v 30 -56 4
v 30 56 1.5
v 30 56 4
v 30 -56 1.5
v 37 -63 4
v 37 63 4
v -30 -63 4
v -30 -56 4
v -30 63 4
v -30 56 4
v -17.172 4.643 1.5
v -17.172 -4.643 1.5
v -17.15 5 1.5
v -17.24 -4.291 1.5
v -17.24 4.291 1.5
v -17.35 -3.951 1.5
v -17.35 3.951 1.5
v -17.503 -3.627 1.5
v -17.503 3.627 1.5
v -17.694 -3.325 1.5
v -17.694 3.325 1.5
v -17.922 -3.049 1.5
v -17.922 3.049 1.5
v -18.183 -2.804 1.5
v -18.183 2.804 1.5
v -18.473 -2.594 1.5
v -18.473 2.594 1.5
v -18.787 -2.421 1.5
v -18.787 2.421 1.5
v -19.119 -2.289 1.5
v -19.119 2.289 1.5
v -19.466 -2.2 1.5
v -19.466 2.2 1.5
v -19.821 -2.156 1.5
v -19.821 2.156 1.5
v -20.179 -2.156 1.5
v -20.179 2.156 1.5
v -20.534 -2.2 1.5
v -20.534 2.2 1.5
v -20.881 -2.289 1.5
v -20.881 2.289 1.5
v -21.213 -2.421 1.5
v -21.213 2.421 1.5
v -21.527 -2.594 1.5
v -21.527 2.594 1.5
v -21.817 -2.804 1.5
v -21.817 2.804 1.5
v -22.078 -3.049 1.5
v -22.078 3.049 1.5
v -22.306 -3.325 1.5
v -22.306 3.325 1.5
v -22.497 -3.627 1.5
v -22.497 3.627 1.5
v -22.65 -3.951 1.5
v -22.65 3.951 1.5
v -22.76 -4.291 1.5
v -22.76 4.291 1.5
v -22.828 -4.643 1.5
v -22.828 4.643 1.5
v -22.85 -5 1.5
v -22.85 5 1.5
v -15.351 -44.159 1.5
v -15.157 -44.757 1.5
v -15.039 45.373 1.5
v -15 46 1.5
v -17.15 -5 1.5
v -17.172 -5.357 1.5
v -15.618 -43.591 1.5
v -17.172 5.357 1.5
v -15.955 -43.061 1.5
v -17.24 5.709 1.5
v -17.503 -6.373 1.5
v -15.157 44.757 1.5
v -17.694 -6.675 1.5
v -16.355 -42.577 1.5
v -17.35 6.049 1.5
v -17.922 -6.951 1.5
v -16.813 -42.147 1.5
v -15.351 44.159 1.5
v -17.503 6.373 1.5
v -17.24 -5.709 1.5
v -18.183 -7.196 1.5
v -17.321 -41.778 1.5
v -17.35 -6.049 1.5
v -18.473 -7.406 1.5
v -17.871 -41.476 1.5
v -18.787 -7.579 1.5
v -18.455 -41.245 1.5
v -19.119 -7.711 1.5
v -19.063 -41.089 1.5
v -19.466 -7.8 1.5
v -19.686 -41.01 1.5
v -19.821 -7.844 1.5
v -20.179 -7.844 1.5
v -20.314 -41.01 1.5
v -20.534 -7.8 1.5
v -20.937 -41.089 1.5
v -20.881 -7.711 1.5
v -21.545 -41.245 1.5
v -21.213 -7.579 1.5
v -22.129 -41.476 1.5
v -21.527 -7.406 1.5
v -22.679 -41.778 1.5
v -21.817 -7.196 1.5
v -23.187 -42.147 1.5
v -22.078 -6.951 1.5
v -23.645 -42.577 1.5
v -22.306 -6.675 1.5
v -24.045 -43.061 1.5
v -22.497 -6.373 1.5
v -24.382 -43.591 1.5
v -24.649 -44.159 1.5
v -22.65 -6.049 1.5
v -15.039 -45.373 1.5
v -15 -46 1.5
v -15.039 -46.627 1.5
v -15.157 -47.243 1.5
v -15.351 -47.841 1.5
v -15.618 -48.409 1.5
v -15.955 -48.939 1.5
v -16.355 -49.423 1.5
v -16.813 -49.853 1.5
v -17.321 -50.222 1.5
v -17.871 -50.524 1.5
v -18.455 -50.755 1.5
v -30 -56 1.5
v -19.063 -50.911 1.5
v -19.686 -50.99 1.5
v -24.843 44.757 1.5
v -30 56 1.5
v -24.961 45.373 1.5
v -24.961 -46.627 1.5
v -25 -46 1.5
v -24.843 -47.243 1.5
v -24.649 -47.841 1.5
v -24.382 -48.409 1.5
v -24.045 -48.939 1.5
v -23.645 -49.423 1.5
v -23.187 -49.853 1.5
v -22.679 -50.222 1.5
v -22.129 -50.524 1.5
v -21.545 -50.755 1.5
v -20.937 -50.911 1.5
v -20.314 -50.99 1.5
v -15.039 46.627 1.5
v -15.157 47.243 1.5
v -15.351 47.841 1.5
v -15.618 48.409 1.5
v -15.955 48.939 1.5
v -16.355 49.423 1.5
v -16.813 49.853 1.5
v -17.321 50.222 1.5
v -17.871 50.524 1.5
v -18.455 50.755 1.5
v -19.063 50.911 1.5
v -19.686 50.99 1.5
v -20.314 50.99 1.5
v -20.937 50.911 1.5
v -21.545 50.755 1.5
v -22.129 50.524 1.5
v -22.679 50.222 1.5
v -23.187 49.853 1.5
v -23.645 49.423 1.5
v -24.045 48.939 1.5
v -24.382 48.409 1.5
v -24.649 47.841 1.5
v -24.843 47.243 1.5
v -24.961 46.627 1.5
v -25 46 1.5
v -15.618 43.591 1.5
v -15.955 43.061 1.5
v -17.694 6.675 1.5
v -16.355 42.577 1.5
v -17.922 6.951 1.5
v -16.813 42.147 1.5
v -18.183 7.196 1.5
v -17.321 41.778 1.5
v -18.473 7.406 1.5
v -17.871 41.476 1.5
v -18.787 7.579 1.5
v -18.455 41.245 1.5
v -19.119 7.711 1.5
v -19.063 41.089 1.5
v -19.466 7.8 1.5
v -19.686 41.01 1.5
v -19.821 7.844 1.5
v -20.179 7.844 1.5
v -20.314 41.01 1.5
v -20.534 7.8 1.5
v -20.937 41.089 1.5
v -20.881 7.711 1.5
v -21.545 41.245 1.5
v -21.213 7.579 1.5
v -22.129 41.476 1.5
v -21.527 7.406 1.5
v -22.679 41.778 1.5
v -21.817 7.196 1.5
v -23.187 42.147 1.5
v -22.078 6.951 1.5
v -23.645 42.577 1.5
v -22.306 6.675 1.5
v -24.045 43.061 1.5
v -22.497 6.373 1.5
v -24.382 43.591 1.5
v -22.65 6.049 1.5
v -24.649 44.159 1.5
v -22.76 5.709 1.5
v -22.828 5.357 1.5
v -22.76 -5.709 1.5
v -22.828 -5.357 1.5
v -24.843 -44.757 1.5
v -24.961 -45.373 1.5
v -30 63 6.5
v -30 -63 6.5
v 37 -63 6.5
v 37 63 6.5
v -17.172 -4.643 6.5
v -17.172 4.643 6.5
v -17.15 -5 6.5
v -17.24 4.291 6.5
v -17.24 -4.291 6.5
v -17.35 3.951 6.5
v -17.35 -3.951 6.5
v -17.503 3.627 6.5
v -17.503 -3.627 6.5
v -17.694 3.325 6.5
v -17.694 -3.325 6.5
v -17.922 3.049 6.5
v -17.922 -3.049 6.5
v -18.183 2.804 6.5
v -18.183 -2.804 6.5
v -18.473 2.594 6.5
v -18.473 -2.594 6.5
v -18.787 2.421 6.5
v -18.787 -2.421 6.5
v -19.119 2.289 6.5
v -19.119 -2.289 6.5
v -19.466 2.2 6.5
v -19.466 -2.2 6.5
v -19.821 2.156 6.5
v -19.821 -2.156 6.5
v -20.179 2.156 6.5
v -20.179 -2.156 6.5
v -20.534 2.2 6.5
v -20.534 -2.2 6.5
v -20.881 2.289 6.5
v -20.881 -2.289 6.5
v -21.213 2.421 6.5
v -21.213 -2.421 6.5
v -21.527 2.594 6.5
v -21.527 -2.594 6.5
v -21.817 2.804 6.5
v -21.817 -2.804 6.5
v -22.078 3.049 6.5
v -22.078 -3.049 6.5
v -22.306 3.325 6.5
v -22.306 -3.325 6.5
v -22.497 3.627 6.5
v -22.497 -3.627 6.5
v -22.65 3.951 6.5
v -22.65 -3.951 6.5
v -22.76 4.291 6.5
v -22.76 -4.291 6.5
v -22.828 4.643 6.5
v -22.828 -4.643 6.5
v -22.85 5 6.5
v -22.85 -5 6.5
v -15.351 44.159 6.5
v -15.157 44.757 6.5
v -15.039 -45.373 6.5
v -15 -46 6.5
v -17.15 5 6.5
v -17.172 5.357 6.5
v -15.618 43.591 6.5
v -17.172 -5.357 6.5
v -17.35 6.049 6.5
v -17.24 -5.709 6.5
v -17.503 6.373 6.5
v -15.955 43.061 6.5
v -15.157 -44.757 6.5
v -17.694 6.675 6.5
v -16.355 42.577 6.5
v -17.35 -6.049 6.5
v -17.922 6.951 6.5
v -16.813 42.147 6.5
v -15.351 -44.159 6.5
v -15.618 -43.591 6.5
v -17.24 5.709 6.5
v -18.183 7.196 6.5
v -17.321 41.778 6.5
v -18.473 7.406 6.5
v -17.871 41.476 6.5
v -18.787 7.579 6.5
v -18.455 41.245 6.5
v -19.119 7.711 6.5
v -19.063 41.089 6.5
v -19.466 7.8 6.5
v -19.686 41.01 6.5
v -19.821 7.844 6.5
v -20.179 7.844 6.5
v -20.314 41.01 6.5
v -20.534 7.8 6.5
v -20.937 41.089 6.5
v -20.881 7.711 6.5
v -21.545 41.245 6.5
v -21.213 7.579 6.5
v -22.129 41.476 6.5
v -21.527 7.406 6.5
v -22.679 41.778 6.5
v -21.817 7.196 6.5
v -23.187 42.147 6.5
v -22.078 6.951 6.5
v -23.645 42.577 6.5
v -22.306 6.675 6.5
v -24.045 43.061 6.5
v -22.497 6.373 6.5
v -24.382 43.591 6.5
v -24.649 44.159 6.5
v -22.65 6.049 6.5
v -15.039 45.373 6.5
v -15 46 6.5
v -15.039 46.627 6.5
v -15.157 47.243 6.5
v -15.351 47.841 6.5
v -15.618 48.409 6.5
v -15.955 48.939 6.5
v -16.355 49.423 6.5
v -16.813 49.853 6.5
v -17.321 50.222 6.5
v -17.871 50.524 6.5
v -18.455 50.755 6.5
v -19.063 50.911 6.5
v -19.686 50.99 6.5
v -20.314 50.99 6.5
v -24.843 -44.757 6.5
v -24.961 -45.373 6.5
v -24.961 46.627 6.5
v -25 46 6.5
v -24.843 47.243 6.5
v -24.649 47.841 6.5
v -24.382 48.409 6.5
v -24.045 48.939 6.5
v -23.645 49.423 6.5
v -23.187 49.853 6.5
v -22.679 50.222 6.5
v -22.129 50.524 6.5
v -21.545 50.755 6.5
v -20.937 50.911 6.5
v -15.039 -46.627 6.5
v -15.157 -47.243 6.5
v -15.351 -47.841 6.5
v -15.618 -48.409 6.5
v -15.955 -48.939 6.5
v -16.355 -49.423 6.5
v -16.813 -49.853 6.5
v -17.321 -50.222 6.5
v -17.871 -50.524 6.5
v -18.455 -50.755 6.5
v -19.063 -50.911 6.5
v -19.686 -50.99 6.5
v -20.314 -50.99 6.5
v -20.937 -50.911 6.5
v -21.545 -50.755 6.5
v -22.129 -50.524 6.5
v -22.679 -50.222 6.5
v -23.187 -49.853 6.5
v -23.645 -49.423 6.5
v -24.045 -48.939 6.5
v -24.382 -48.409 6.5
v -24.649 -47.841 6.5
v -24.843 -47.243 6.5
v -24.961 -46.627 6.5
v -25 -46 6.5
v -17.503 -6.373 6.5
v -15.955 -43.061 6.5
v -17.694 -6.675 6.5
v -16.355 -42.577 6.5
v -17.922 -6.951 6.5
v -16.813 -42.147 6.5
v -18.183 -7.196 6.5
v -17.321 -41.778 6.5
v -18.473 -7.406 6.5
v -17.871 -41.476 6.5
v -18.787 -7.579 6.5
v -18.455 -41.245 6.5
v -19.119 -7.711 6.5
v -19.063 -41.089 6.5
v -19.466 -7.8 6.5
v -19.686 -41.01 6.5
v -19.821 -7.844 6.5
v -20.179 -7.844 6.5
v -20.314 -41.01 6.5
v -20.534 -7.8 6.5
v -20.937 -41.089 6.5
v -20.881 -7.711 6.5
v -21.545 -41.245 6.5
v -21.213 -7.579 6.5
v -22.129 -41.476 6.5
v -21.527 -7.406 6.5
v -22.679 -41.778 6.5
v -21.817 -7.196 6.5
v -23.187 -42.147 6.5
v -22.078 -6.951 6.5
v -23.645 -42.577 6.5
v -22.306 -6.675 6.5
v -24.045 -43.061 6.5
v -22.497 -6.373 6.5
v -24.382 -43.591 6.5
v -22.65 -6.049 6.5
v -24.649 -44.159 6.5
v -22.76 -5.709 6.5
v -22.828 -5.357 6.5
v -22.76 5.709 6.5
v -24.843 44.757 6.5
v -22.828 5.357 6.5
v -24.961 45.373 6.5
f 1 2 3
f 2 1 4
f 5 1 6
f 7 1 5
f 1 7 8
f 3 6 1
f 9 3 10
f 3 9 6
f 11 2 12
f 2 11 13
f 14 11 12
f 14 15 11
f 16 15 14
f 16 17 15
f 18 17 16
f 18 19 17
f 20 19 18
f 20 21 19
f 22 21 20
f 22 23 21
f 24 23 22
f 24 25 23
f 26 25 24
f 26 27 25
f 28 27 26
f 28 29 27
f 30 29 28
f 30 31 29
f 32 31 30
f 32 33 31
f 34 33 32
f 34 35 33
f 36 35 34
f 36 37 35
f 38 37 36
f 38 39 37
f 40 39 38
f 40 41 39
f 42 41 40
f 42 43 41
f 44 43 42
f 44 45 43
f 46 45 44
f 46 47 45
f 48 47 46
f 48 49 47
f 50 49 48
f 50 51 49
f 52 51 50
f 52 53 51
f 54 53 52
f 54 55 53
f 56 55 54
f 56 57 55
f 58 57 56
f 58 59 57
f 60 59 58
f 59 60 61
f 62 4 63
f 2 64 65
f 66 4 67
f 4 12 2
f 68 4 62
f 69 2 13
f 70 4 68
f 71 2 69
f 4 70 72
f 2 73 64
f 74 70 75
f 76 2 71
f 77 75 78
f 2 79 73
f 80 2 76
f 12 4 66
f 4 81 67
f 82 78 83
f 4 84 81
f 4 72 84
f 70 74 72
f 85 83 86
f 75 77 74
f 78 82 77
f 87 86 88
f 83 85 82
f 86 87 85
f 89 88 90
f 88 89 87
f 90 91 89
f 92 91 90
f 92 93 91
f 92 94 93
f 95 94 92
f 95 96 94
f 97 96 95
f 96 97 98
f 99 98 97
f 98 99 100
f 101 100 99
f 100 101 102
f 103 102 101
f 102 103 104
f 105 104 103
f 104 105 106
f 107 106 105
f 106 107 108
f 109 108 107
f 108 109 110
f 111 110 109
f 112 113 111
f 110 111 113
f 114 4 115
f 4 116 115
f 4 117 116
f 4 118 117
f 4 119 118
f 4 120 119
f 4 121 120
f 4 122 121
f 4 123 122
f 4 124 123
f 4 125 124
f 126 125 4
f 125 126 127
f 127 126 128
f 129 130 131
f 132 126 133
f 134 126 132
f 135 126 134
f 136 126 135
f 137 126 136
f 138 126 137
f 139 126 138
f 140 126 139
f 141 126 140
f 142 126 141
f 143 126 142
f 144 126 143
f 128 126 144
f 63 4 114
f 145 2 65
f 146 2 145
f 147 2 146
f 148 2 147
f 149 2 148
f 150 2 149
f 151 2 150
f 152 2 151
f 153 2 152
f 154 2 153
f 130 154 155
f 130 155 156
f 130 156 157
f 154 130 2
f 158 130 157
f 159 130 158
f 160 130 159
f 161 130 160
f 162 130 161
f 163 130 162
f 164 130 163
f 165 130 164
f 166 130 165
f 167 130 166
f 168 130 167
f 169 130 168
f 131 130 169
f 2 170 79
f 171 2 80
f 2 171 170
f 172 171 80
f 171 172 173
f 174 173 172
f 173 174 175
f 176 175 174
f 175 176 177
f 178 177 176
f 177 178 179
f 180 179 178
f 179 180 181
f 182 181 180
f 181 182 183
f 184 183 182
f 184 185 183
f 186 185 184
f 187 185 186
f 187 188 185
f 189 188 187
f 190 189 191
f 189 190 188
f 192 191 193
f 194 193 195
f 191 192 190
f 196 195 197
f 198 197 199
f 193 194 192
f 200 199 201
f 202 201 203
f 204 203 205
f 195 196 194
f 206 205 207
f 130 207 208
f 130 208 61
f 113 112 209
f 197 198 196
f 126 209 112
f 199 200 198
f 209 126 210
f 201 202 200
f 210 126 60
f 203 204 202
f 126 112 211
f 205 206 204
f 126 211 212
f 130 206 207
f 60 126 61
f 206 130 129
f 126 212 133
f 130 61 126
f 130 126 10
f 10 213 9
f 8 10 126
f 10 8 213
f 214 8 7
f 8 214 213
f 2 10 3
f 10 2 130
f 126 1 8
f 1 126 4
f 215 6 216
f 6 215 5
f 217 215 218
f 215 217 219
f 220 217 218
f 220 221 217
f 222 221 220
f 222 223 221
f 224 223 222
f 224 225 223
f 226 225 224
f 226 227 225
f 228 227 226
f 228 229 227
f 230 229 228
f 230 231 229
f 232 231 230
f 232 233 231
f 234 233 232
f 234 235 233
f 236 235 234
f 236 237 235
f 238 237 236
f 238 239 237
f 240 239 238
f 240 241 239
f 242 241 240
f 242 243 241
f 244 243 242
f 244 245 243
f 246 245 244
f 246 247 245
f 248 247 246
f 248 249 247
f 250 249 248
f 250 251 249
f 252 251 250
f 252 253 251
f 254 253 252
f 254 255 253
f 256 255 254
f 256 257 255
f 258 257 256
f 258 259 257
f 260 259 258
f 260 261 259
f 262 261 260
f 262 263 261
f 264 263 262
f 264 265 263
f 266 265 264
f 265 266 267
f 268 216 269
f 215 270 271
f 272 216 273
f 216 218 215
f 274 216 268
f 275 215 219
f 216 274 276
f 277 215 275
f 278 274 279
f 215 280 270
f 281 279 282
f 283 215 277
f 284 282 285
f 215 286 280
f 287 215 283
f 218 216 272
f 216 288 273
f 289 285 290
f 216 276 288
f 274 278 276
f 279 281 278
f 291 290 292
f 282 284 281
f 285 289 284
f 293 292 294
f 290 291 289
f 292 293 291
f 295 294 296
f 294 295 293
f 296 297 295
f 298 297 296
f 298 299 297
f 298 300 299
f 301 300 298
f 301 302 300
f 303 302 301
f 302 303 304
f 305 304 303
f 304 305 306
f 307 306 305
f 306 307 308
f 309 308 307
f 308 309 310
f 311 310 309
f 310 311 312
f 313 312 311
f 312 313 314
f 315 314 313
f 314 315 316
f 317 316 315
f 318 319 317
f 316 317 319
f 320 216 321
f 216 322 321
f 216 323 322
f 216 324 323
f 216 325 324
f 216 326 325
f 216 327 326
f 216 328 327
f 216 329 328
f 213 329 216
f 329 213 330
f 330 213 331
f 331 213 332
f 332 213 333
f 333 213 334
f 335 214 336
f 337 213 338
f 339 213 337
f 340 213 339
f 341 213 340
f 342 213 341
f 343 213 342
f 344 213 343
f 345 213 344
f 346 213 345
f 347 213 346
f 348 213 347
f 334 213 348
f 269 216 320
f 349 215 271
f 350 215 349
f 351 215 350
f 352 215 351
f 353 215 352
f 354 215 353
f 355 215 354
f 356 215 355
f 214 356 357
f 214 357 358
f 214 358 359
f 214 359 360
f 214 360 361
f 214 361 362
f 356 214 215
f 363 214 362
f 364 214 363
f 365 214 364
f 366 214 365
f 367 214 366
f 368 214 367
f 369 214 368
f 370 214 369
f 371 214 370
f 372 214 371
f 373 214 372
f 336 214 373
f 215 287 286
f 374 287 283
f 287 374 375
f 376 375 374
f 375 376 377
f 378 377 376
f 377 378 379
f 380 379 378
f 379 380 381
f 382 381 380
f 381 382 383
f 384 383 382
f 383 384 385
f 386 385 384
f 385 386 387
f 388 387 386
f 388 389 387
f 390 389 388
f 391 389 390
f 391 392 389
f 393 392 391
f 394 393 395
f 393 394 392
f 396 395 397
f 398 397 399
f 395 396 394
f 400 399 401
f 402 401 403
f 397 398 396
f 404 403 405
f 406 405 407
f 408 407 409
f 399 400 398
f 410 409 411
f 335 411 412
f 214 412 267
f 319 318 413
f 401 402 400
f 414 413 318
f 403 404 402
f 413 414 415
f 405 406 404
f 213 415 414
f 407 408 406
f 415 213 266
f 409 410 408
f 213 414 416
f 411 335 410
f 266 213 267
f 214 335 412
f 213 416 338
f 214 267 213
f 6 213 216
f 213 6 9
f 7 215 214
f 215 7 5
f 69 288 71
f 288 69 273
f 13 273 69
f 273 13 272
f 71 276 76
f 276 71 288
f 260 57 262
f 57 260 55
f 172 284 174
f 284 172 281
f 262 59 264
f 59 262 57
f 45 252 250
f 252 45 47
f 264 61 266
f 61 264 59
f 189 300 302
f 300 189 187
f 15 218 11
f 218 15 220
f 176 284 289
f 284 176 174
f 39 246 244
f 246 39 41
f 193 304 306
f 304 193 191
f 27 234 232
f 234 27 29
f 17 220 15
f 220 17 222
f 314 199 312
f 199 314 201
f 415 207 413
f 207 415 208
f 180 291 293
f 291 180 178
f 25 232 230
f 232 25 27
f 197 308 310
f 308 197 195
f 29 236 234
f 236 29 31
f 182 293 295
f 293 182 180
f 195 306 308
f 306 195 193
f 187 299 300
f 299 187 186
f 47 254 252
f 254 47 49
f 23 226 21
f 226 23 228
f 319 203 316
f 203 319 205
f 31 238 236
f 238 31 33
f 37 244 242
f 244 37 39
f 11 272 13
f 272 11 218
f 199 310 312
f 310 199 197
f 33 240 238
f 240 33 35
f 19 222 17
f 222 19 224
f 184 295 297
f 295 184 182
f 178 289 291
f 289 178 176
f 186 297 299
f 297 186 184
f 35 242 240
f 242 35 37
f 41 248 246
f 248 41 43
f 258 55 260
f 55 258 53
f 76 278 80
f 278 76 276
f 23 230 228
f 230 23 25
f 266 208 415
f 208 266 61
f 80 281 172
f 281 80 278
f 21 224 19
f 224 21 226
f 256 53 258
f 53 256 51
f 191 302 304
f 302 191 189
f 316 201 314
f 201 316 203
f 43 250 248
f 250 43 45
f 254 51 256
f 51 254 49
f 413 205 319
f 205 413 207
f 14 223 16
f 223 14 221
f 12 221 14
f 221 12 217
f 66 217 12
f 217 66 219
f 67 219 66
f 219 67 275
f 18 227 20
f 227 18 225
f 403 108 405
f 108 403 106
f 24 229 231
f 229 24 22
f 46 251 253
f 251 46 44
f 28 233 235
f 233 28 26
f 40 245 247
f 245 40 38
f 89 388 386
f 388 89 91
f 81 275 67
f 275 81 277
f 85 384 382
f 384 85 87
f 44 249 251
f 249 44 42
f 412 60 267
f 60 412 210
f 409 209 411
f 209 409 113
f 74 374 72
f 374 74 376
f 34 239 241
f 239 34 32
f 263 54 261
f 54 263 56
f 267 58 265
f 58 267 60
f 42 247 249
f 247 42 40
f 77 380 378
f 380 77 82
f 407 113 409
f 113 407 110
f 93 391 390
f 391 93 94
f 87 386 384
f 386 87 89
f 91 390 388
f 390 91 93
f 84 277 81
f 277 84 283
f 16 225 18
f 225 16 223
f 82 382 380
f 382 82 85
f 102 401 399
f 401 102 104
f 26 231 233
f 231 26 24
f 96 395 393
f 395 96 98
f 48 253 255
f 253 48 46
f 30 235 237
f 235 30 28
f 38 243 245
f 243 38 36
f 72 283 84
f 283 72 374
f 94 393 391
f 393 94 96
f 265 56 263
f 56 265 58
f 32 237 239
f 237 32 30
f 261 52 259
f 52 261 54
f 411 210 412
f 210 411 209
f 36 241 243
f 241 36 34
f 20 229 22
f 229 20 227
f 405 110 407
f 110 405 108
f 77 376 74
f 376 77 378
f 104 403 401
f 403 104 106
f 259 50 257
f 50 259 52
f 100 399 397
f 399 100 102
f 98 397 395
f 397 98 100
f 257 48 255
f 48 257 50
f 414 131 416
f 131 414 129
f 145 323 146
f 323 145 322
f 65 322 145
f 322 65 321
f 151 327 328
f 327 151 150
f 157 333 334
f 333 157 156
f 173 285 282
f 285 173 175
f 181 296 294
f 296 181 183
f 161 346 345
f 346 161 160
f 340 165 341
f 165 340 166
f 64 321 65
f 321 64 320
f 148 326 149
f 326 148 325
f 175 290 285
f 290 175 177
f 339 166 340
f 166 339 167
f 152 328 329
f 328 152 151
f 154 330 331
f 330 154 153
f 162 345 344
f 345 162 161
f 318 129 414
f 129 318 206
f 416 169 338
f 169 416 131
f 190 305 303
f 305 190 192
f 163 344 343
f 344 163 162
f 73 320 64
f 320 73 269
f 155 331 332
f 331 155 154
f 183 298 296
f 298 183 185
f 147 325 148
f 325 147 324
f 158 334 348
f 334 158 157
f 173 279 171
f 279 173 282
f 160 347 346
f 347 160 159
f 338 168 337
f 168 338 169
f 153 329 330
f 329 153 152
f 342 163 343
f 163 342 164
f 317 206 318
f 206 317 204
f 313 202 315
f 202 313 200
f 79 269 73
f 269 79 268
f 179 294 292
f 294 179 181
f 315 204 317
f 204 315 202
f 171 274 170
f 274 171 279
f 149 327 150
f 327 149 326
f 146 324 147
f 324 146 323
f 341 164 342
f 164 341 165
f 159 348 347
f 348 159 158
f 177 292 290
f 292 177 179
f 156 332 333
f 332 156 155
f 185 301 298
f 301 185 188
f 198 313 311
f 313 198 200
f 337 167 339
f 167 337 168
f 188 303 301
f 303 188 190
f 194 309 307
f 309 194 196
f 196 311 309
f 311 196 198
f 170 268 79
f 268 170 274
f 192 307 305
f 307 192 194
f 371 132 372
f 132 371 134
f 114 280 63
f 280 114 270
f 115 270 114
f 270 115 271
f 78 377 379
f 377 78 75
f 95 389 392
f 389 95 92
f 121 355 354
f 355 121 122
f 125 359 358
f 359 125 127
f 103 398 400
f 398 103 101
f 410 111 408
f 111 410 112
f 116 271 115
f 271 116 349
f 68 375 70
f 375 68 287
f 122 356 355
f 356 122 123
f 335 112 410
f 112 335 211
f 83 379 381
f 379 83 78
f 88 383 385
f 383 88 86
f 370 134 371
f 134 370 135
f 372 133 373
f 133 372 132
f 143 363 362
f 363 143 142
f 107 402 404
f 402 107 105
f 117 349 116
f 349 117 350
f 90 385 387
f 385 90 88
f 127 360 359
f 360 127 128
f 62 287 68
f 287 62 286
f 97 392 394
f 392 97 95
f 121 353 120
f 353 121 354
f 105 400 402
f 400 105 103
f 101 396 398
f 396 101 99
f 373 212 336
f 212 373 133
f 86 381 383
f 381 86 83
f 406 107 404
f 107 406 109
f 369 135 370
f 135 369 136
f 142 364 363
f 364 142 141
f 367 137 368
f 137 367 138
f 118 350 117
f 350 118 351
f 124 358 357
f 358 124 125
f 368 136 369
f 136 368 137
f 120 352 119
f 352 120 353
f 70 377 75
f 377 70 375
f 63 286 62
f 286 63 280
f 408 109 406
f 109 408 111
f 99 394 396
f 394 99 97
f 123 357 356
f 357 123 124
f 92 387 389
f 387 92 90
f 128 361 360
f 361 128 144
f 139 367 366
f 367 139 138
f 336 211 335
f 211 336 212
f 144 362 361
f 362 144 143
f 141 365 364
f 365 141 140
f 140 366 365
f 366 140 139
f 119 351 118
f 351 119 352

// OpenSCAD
depth = 60;
boat_width = 112;
oversize = 7;
thickness = 2.5;
pipe_distance = 10;
pipe_d = 5.7;
screw_d = 3.5;
lock_side_offset = 5;

size = 4;
lock_width = 12;
lock_length = 5;

camlock_d=10;

big_eps = 0.5;

$fn=50;

//rotate([0,180,0])
translate([0,0,4])
back_cover_base();

module back_cover_base(){
    difference() {
        union(){
            translate([0,0,-thickness/2])cube([depth,boat_width,thickness],center=true);
            color("#a88132")translate([oversize/2,0,thickness/2])cube([depth+oversize,boat_width+2*oversize,thickness],center=true);
        }
        translate([-depth/2+10,+pipe_distance/2,0]) rotate([0,0,0]) cylinder(h=thickness*10,d=pipe_d, center=true);
        translate([-depth/2+10,-pipe_distance/2,0]) rotate([0,0,0]) cylinder(h=thickness*10,d=pipe_d, center=true);
        
        translate([-depth/2+10,+(boat_width/2-10),0]) rotate([0,0,0]) cylinder(h=thickness*10,d=camlock_d, center=true);
        translate([-depth/2+10,-(boat_width/2-10),0]) rotate([0,0,0]) cylinder(h=thickness*10,d=camlock_d, center=true);
        /*
        translate([0,-boat_width/2+lock_side_offset,-thickness-size/2])
            color("red")lock_hole();
        translate([0,-(-boat_width/2+lock_side_offset),-thickness-size/2])
            lock_hole();
        */
    }
}

/*
module lock(){
        translate([0,lock_length+size,0]) rotate([0,90,0])
                cylinder(h=lock_width+size, d=size-big_eps, center=true);
        length = lock_length+lock_side_offset+10;
        translate([0,-length/2+lock_length+size,0])
            difference() {
                cube([lock_width-size-big_eps, length, size-big_eps], center=true);
                translate([0,-length/2-size+1,-size]) rotate([20,0,0])
                        cube(10, center=true);
                lock_hole();
            }
}

module lock_hole(){
        cylinder(h=thickness*10,d=screw_d, center=true);
}

module lock_holder(){
        translate([lock_width/2,lock_length,0])cube(size, center=true);
        translate([-lock_width/2,lock_length,0])cube(size, center=true);
        translate([0,2*size+lock_length,0])cube([lock_width+size,size,size], center=true);
}
*/
